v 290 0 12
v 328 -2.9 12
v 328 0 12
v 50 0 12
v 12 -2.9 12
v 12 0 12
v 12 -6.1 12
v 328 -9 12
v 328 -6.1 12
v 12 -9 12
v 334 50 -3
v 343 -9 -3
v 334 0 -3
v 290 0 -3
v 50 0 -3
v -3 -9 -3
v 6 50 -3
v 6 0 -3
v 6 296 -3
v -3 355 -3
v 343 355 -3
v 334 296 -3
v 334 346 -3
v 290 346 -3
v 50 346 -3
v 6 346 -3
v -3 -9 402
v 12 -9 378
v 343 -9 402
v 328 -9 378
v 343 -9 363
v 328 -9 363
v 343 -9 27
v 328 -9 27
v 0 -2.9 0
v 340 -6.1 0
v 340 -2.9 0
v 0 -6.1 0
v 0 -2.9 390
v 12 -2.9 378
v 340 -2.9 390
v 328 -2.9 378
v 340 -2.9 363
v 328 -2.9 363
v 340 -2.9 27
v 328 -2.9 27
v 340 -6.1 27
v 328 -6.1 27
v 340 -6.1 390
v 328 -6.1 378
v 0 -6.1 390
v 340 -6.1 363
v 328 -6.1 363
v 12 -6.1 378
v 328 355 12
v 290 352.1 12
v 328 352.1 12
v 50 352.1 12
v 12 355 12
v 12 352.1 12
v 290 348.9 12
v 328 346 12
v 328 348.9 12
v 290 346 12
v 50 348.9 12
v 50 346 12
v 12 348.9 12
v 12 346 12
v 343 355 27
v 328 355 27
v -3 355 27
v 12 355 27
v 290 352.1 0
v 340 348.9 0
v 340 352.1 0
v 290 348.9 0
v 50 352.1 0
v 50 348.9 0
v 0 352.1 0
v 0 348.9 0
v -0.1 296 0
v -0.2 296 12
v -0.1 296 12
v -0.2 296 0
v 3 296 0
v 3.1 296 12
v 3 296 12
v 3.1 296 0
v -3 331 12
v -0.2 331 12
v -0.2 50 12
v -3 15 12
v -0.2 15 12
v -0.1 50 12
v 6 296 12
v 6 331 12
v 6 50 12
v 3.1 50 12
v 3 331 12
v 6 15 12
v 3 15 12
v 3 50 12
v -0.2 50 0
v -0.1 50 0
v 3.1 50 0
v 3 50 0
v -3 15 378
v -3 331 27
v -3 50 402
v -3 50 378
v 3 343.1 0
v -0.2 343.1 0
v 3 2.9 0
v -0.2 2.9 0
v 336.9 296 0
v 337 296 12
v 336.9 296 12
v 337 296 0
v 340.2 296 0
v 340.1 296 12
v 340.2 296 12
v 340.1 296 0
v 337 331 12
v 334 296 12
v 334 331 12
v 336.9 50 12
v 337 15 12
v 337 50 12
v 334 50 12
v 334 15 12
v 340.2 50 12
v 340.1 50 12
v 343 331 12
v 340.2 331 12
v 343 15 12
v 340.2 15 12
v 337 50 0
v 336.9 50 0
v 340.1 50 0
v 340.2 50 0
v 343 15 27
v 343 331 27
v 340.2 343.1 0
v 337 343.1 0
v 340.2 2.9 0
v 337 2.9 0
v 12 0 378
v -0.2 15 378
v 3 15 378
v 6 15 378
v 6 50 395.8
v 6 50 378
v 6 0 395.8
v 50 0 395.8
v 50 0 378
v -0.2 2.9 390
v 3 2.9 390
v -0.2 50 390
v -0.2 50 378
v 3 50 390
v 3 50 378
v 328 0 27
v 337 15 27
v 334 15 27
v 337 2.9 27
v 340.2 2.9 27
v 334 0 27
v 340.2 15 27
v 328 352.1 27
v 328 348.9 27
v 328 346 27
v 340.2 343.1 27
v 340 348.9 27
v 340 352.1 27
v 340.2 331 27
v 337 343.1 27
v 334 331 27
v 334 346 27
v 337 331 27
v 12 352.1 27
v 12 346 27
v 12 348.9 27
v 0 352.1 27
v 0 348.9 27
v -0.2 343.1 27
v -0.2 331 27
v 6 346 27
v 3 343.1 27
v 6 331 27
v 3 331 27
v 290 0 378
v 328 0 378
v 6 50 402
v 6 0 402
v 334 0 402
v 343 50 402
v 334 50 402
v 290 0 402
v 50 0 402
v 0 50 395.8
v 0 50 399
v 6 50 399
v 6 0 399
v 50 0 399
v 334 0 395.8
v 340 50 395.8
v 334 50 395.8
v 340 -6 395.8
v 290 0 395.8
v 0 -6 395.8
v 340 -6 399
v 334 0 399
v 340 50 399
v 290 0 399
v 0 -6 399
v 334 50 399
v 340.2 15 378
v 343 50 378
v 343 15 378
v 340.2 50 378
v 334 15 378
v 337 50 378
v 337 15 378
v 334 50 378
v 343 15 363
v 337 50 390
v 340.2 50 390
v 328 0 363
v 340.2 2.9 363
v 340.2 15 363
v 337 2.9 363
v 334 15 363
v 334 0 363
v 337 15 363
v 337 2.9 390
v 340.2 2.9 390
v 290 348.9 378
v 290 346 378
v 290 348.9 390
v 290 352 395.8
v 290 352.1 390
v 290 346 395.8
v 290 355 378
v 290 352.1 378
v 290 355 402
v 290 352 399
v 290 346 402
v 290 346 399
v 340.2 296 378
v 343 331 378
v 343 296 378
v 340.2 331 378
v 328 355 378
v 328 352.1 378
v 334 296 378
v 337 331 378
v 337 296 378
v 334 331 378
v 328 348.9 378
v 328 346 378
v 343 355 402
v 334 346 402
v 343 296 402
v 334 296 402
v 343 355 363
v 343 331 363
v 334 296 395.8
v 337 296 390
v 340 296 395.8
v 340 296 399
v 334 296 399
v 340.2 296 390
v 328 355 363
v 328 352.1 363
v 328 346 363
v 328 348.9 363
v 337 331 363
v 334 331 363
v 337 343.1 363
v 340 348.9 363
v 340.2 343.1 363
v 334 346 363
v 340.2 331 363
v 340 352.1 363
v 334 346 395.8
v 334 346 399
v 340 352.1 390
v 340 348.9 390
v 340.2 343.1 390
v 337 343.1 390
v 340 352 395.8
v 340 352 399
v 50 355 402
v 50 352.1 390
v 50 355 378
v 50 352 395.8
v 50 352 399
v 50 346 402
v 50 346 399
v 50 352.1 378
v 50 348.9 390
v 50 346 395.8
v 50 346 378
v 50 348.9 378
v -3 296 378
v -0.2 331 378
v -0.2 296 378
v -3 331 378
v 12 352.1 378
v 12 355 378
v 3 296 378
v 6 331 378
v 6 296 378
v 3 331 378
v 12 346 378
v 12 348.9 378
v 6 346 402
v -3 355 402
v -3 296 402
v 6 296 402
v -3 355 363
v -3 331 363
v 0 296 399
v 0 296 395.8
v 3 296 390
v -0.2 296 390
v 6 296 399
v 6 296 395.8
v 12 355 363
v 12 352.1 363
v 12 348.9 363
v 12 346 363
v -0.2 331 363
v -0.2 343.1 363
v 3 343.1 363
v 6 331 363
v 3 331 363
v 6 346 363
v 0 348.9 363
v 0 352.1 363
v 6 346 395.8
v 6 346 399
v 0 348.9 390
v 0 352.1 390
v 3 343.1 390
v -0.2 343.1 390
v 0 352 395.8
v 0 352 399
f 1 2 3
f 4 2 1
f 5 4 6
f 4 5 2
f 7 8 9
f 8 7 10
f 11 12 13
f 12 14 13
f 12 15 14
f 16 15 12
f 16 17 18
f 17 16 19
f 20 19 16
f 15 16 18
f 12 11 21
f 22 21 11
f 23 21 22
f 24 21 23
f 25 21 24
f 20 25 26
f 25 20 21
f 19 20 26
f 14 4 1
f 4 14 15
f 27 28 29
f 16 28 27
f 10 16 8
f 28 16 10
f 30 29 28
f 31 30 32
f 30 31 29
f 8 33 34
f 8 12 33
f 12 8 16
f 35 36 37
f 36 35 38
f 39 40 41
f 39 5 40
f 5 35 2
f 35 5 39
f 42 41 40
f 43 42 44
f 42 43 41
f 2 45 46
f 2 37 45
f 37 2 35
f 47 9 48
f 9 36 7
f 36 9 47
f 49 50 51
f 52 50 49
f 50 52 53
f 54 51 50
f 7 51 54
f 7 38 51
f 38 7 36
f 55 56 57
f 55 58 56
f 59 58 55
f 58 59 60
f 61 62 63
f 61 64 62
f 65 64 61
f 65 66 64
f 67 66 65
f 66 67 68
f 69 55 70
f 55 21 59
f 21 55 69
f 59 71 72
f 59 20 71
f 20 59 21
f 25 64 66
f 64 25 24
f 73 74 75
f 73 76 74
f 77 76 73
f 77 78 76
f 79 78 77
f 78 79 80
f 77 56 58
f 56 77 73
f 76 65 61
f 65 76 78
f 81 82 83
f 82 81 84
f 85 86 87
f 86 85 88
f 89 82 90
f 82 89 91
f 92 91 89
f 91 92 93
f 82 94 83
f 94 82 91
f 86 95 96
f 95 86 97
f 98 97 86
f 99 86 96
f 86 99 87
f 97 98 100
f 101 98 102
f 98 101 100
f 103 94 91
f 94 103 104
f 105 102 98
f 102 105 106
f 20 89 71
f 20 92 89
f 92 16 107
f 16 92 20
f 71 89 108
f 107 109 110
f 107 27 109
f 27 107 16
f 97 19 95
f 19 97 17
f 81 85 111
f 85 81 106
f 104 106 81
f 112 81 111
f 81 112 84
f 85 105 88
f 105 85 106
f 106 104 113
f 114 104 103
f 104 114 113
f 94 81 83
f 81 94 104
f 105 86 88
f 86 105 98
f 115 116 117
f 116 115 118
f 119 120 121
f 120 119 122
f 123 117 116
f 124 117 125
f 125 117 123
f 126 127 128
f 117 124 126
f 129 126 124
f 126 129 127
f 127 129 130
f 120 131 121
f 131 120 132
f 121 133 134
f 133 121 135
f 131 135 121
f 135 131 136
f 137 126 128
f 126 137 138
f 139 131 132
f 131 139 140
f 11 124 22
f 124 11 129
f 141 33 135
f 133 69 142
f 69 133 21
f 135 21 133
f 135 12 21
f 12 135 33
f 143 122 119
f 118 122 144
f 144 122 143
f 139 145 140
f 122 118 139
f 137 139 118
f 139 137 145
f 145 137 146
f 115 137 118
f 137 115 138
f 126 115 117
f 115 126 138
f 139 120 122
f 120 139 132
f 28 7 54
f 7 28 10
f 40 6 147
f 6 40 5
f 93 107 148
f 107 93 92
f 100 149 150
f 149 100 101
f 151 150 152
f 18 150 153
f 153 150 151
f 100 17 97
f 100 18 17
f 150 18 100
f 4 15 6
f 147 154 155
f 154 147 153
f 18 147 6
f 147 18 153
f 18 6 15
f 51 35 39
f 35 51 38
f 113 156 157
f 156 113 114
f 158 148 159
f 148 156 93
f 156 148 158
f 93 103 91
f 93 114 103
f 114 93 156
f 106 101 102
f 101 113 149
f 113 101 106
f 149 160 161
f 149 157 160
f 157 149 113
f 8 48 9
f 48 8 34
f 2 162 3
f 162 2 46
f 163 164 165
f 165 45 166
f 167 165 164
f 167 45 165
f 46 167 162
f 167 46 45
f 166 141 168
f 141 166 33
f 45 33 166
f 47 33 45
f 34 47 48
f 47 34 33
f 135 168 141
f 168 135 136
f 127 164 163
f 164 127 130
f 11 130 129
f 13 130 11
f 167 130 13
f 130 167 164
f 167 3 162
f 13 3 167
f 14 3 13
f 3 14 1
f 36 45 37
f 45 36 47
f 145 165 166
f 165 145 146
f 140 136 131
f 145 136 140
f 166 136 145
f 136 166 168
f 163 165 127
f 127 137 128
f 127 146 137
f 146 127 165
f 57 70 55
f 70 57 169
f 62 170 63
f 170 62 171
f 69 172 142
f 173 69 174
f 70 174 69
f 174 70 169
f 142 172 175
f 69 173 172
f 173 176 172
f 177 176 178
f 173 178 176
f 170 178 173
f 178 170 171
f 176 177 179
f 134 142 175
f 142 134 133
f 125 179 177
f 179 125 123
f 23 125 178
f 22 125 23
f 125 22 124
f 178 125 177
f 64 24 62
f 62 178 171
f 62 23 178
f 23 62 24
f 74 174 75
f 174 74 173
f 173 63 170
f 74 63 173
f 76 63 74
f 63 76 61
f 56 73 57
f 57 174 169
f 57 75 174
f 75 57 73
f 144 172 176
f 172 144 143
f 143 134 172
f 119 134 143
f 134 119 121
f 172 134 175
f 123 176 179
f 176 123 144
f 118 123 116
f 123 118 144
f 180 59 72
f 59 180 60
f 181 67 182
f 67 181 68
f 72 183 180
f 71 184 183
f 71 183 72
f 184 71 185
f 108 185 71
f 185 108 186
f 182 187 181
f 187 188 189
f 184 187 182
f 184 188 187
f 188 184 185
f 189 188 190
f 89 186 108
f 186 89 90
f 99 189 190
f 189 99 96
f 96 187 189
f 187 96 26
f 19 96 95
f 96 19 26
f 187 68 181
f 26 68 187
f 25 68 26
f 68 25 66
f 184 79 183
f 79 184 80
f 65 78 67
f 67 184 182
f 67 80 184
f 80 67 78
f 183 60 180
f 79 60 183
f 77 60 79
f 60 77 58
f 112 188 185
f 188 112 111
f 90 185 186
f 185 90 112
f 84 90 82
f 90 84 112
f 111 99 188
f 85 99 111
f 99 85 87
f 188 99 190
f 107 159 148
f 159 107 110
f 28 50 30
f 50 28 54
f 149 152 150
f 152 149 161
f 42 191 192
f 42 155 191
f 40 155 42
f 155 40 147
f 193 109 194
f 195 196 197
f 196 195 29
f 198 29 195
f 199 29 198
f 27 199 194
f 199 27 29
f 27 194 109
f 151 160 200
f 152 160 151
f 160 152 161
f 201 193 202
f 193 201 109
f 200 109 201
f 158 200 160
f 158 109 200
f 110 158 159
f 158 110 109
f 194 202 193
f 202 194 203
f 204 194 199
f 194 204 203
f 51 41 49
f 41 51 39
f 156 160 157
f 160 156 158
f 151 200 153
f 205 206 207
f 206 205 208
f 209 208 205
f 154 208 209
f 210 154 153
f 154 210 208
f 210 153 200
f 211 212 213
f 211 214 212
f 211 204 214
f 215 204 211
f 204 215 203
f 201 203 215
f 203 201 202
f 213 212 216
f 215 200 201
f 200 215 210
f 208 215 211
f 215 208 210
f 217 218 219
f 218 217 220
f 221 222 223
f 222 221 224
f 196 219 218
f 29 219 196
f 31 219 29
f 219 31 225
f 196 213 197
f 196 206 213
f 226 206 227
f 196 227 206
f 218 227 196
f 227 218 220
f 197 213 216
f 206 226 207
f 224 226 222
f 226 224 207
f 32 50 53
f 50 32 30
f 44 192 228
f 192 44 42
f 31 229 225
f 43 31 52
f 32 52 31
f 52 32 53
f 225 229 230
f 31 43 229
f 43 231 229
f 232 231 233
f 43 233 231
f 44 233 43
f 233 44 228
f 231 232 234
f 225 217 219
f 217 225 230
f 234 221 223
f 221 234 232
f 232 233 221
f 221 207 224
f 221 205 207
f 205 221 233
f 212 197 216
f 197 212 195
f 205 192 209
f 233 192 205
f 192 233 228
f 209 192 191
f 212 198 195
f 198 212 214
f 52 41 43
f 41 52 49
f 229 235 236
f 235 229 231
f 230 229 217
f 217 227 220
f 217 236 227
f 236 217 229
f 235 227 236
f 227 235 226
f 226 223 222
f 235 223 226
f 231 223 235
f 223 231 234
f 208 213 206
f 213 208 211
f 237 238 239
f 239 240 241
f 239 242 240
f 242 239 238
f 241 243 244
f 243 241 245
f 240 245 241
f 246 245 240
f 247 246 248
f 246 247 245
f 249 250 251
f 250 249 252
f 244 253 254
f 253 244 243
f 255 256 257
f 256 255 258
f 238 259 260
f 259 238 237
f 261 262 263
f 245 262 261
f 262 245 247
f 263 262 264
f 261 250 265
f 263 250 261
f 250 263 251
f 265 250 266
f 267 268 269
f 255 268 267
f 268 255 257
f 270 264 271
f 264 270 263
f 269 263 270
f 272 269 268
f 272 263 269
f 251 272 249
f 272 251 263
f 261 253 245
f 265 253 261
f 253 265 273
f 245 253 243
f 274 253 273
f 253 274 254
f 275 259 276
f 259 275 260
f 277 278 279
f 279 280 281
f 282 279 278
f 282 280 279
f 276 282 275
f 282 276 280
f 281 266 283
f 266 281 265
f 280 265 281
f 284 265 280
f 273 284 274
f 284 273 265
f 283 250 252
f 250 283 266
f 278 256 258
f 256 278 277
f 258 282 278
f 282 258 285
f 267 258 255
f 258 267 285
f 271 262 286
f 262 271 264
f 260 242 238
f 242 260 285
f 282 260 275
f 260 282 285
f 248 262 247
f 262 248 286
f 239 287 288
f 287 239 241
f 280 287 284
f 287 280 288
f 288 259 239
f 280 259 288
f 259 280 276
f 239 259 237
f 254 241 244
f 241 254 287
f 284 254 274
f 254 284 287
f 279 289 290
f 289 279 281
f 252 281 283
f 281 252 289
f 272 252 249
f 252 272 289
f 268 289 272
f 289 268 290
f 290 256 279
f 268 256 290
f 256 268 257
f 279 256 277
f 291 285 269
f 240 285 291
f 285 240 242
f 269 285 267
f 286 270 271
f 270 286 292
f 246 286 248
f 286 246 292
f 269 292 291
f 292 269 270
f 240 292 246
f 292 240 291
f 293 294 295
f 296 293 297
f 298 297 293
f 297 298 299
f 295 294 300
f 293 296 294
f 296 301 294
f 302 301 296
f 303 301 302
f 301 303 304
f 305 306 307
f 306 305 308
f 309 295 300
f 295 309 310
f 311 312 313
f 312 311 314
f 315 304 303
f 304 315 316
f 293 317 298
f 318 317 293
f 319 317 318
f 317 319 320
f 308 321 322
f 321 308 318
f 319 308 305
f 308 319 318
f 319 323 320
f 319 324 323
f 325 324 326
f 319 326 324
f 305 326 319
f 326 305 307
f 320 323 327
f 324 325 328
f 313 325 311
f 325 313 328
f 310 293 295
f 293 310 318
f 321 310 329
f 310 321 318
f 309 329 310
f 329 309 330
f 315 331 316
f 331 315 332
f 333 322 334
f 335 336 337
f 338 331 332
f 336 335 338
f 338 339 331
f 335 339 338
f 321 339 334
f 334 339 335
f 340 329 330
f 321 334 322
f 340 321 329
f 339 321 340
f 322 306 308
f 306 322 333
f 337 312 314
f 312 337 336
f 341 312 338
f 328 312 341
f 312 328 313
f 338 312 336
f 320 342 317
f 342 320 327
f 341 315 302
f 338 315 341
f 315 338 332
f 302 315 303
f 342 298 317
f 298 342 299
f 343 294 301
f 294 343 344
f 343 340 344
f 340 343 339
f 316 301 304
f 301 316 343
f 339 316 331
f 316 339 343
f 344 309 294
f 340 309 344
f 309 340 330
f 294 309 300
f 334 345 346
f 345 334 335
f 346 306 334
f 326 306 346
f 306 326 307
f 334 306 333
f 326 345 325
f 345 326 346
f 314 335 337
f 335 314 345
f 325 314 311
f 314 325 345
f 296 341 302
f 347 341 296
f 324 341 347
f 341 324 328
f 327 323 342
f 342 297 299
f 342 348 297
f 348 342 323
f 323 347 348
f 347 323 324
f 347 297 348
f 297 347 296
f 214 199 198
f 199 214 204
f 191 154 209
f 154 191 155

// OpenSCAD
// Plates
// 340x390x3 x4 = 0.53m2
// 340x358x3 x1 = 0.12m2

wall_thickness = 3;
height = 390;
width = 340;
depth = 340;

offset = 0.2; // Additional space for connectors
edge_height = 15;

if ($preview) {
    #box();
}

// bottom edges
translate([(width - 240) / 2, -9, -3]) bottom_edge(width = 240);
translate([(width - 240) / 2, 6 + depth, -3]) bottom_edge(width = 240);
translate([6, (width - 240) / 2, -3]) rotate([0, 0, 90]) bottom_edge(width = 246);
translate([3 + depth, (width - 240) / 2, -3]) rotate([0, 0, 90]) bottom_edge(width = 246);

// bottom corners
translate([-3, -9, -3]) bottom_corner();
mirror([1, 0, 0]) translate([-width - 3, -9, -3]) bottom_corner();
translate([width, depth + 6, 0]) rotate([0, 0, 180]) {
    translate([-3, -9, -3]) bottom_corner();
    mirror([1, 0, 0]) translate([-width - 3, -9, -3]) bottom_corner();
}

// top-bottom corners
translate([-3, -9, edge_height - 3]) top_bottom_corner();

// top corners
mirror([0, 0, 1]) {
    translate([0, 0, -height]) {
        translate([-3, -9, -3]) top_corner();
        mirror([1, 0, 0]) translate([-width - 3, -9, -3]) top_corner();
        translate([width, depth + 6, 0]) rotate([0, 0, 180]) {
            translate([-3, -9, -3]) top_corner();
            mirror([1, 0, 0]) translate([-width - 3, -9, -3]) top_corner();
        }
    }
}

// top edges
translate([(width - 240) / 2, -9, height - 12]) top_edge(width = 240);

module box() {
    // Front
    translate([0, -wall_thickness * 2, 0]) 
        cube([width, wall_thickness, height]);

    // Back
    translate([0, depth + wall_thickness + wall_thickness * 2, 0]) 
        cube([width, wall_thickness, height]);

    // Left
    translate([0, wall_thickness, 0]) 
        cube([wall_thickness, depth, height]);

    // Right
    translate([depth - wall_thickness, wall_thickness, 0]) 
        cube([wall_thickness, depth, height]);

    // Top
    translate([0, -6, height + wall_thickness * 2]) 
        cube([width, depth + 18, wall_thickness]);
}

module bottom_edge(width = 200) {
    color([0.3, 0.3, 0.3]) difference() {
        cube([width, 9, edge_height]);
        translate([-1, (9 - wall_thickness) / 2 - offset / 2, 3]) 
            cube([width + 2, wall_thickness + offset, edge_height]);
    }
}

module top_edge(width = 200) {
    color([0.3, 0.3, 0.3]) difference() {
        cube([width, 9, edge_height + 9]);
        translate([-1, (9 - wall_thickness) / 2 - offset / 2, -3]) 
            cube([width + 2, wall_thickness + offset, edge_height]);
        translate([-1, 3, 12 + wall_thickness * 2 - offset / 1]) 
            cube([width + 2, 6 + wall_thickness * 2, wall_thickness + offset]);
    }
}

module bottom_corner() {
    color([0.5, 0.5, 0.5]) difference() {
        translate([0, 0, 0]) {
            cube([53, 59, edge_height]);
            translate([0, 0, edge_height]) 
                cube([edge_height, edge_height + 9, edge_height]);
        }
        translate([9, 9, -1]) cube([53, 59, 50]);
        translate([3, (9 - wall_thickness) / 2 - offset / 2, 3]) 
            cube([width + 2, wall_thickness + offset, edge_height * 3]);
        translate([6, (27 - wall_thickness) / 2 - offset / 2, 3]) 
            rotate([0, 0, 90]) 
                cube([width + 2, wall_thickness + offset, edge_height * 3]);
    }
}

module top_corner() {
    color([0.5, 0.5, 0.5]) difference() {
        translate([0, 0, 0]) {
            translate([0, 0, -9]) cube([53, 59, edge_height + 9]);
            translate([0, 0, edge_height]) 
                cube([edge_height, edge_height + 9, edge_height]);
        }
        translate([9, 9, -10]) cube([53, 59, 70]);
        translate([3, (9 - wall_thickness) / 2 - offset / 2, 3]) 
            cube([width + 2, wall_thickness + offset, edge_height * 3]);
        translate([6, (27 - wall_thickness) / 2 - offset / 2, 3]) 
            rotate([0, 0, 90]) 
                cube([width + 2, wall_thickness + offset, edge_height * 3]);
                
        translate([3, 3, -12 + wall_thickness * 2]) 
            cube([width/3, depth /3+ wall_thickness * 2, wall_thickness + offset]);
    }
}

module top_bottom_corner() {
    color([0.3, 0.3, 0.3]) difference() {
        translate([0, 0, 0]) {
            translate([0, 0, edge_height]) 
                cube([edge_height, edge_height + 9, height - edge_height * 3 - 9]);
        }
        translate([9, 9, -1]) cube([53, 59, height + 50]);
        translate([3, (9 - wall_thickness) / 2 - offset / 2, 3]) 
            cube([width + 2, wall_thickness + offset, height + edge_height * 3]);
        translate([6, (27 - wall_thickness) / 2 - offset / 2, 3]) 
            rotate([0, 0, 90]) 
                cube([width + 2, wall_thickness + offset, height + edge_height * 3]);
    }
}

if ($preview) {
    translate([140, 140, 70]) import("C:/Users/darek/Downloads/PrusaMini+_aligned.stl");
}
